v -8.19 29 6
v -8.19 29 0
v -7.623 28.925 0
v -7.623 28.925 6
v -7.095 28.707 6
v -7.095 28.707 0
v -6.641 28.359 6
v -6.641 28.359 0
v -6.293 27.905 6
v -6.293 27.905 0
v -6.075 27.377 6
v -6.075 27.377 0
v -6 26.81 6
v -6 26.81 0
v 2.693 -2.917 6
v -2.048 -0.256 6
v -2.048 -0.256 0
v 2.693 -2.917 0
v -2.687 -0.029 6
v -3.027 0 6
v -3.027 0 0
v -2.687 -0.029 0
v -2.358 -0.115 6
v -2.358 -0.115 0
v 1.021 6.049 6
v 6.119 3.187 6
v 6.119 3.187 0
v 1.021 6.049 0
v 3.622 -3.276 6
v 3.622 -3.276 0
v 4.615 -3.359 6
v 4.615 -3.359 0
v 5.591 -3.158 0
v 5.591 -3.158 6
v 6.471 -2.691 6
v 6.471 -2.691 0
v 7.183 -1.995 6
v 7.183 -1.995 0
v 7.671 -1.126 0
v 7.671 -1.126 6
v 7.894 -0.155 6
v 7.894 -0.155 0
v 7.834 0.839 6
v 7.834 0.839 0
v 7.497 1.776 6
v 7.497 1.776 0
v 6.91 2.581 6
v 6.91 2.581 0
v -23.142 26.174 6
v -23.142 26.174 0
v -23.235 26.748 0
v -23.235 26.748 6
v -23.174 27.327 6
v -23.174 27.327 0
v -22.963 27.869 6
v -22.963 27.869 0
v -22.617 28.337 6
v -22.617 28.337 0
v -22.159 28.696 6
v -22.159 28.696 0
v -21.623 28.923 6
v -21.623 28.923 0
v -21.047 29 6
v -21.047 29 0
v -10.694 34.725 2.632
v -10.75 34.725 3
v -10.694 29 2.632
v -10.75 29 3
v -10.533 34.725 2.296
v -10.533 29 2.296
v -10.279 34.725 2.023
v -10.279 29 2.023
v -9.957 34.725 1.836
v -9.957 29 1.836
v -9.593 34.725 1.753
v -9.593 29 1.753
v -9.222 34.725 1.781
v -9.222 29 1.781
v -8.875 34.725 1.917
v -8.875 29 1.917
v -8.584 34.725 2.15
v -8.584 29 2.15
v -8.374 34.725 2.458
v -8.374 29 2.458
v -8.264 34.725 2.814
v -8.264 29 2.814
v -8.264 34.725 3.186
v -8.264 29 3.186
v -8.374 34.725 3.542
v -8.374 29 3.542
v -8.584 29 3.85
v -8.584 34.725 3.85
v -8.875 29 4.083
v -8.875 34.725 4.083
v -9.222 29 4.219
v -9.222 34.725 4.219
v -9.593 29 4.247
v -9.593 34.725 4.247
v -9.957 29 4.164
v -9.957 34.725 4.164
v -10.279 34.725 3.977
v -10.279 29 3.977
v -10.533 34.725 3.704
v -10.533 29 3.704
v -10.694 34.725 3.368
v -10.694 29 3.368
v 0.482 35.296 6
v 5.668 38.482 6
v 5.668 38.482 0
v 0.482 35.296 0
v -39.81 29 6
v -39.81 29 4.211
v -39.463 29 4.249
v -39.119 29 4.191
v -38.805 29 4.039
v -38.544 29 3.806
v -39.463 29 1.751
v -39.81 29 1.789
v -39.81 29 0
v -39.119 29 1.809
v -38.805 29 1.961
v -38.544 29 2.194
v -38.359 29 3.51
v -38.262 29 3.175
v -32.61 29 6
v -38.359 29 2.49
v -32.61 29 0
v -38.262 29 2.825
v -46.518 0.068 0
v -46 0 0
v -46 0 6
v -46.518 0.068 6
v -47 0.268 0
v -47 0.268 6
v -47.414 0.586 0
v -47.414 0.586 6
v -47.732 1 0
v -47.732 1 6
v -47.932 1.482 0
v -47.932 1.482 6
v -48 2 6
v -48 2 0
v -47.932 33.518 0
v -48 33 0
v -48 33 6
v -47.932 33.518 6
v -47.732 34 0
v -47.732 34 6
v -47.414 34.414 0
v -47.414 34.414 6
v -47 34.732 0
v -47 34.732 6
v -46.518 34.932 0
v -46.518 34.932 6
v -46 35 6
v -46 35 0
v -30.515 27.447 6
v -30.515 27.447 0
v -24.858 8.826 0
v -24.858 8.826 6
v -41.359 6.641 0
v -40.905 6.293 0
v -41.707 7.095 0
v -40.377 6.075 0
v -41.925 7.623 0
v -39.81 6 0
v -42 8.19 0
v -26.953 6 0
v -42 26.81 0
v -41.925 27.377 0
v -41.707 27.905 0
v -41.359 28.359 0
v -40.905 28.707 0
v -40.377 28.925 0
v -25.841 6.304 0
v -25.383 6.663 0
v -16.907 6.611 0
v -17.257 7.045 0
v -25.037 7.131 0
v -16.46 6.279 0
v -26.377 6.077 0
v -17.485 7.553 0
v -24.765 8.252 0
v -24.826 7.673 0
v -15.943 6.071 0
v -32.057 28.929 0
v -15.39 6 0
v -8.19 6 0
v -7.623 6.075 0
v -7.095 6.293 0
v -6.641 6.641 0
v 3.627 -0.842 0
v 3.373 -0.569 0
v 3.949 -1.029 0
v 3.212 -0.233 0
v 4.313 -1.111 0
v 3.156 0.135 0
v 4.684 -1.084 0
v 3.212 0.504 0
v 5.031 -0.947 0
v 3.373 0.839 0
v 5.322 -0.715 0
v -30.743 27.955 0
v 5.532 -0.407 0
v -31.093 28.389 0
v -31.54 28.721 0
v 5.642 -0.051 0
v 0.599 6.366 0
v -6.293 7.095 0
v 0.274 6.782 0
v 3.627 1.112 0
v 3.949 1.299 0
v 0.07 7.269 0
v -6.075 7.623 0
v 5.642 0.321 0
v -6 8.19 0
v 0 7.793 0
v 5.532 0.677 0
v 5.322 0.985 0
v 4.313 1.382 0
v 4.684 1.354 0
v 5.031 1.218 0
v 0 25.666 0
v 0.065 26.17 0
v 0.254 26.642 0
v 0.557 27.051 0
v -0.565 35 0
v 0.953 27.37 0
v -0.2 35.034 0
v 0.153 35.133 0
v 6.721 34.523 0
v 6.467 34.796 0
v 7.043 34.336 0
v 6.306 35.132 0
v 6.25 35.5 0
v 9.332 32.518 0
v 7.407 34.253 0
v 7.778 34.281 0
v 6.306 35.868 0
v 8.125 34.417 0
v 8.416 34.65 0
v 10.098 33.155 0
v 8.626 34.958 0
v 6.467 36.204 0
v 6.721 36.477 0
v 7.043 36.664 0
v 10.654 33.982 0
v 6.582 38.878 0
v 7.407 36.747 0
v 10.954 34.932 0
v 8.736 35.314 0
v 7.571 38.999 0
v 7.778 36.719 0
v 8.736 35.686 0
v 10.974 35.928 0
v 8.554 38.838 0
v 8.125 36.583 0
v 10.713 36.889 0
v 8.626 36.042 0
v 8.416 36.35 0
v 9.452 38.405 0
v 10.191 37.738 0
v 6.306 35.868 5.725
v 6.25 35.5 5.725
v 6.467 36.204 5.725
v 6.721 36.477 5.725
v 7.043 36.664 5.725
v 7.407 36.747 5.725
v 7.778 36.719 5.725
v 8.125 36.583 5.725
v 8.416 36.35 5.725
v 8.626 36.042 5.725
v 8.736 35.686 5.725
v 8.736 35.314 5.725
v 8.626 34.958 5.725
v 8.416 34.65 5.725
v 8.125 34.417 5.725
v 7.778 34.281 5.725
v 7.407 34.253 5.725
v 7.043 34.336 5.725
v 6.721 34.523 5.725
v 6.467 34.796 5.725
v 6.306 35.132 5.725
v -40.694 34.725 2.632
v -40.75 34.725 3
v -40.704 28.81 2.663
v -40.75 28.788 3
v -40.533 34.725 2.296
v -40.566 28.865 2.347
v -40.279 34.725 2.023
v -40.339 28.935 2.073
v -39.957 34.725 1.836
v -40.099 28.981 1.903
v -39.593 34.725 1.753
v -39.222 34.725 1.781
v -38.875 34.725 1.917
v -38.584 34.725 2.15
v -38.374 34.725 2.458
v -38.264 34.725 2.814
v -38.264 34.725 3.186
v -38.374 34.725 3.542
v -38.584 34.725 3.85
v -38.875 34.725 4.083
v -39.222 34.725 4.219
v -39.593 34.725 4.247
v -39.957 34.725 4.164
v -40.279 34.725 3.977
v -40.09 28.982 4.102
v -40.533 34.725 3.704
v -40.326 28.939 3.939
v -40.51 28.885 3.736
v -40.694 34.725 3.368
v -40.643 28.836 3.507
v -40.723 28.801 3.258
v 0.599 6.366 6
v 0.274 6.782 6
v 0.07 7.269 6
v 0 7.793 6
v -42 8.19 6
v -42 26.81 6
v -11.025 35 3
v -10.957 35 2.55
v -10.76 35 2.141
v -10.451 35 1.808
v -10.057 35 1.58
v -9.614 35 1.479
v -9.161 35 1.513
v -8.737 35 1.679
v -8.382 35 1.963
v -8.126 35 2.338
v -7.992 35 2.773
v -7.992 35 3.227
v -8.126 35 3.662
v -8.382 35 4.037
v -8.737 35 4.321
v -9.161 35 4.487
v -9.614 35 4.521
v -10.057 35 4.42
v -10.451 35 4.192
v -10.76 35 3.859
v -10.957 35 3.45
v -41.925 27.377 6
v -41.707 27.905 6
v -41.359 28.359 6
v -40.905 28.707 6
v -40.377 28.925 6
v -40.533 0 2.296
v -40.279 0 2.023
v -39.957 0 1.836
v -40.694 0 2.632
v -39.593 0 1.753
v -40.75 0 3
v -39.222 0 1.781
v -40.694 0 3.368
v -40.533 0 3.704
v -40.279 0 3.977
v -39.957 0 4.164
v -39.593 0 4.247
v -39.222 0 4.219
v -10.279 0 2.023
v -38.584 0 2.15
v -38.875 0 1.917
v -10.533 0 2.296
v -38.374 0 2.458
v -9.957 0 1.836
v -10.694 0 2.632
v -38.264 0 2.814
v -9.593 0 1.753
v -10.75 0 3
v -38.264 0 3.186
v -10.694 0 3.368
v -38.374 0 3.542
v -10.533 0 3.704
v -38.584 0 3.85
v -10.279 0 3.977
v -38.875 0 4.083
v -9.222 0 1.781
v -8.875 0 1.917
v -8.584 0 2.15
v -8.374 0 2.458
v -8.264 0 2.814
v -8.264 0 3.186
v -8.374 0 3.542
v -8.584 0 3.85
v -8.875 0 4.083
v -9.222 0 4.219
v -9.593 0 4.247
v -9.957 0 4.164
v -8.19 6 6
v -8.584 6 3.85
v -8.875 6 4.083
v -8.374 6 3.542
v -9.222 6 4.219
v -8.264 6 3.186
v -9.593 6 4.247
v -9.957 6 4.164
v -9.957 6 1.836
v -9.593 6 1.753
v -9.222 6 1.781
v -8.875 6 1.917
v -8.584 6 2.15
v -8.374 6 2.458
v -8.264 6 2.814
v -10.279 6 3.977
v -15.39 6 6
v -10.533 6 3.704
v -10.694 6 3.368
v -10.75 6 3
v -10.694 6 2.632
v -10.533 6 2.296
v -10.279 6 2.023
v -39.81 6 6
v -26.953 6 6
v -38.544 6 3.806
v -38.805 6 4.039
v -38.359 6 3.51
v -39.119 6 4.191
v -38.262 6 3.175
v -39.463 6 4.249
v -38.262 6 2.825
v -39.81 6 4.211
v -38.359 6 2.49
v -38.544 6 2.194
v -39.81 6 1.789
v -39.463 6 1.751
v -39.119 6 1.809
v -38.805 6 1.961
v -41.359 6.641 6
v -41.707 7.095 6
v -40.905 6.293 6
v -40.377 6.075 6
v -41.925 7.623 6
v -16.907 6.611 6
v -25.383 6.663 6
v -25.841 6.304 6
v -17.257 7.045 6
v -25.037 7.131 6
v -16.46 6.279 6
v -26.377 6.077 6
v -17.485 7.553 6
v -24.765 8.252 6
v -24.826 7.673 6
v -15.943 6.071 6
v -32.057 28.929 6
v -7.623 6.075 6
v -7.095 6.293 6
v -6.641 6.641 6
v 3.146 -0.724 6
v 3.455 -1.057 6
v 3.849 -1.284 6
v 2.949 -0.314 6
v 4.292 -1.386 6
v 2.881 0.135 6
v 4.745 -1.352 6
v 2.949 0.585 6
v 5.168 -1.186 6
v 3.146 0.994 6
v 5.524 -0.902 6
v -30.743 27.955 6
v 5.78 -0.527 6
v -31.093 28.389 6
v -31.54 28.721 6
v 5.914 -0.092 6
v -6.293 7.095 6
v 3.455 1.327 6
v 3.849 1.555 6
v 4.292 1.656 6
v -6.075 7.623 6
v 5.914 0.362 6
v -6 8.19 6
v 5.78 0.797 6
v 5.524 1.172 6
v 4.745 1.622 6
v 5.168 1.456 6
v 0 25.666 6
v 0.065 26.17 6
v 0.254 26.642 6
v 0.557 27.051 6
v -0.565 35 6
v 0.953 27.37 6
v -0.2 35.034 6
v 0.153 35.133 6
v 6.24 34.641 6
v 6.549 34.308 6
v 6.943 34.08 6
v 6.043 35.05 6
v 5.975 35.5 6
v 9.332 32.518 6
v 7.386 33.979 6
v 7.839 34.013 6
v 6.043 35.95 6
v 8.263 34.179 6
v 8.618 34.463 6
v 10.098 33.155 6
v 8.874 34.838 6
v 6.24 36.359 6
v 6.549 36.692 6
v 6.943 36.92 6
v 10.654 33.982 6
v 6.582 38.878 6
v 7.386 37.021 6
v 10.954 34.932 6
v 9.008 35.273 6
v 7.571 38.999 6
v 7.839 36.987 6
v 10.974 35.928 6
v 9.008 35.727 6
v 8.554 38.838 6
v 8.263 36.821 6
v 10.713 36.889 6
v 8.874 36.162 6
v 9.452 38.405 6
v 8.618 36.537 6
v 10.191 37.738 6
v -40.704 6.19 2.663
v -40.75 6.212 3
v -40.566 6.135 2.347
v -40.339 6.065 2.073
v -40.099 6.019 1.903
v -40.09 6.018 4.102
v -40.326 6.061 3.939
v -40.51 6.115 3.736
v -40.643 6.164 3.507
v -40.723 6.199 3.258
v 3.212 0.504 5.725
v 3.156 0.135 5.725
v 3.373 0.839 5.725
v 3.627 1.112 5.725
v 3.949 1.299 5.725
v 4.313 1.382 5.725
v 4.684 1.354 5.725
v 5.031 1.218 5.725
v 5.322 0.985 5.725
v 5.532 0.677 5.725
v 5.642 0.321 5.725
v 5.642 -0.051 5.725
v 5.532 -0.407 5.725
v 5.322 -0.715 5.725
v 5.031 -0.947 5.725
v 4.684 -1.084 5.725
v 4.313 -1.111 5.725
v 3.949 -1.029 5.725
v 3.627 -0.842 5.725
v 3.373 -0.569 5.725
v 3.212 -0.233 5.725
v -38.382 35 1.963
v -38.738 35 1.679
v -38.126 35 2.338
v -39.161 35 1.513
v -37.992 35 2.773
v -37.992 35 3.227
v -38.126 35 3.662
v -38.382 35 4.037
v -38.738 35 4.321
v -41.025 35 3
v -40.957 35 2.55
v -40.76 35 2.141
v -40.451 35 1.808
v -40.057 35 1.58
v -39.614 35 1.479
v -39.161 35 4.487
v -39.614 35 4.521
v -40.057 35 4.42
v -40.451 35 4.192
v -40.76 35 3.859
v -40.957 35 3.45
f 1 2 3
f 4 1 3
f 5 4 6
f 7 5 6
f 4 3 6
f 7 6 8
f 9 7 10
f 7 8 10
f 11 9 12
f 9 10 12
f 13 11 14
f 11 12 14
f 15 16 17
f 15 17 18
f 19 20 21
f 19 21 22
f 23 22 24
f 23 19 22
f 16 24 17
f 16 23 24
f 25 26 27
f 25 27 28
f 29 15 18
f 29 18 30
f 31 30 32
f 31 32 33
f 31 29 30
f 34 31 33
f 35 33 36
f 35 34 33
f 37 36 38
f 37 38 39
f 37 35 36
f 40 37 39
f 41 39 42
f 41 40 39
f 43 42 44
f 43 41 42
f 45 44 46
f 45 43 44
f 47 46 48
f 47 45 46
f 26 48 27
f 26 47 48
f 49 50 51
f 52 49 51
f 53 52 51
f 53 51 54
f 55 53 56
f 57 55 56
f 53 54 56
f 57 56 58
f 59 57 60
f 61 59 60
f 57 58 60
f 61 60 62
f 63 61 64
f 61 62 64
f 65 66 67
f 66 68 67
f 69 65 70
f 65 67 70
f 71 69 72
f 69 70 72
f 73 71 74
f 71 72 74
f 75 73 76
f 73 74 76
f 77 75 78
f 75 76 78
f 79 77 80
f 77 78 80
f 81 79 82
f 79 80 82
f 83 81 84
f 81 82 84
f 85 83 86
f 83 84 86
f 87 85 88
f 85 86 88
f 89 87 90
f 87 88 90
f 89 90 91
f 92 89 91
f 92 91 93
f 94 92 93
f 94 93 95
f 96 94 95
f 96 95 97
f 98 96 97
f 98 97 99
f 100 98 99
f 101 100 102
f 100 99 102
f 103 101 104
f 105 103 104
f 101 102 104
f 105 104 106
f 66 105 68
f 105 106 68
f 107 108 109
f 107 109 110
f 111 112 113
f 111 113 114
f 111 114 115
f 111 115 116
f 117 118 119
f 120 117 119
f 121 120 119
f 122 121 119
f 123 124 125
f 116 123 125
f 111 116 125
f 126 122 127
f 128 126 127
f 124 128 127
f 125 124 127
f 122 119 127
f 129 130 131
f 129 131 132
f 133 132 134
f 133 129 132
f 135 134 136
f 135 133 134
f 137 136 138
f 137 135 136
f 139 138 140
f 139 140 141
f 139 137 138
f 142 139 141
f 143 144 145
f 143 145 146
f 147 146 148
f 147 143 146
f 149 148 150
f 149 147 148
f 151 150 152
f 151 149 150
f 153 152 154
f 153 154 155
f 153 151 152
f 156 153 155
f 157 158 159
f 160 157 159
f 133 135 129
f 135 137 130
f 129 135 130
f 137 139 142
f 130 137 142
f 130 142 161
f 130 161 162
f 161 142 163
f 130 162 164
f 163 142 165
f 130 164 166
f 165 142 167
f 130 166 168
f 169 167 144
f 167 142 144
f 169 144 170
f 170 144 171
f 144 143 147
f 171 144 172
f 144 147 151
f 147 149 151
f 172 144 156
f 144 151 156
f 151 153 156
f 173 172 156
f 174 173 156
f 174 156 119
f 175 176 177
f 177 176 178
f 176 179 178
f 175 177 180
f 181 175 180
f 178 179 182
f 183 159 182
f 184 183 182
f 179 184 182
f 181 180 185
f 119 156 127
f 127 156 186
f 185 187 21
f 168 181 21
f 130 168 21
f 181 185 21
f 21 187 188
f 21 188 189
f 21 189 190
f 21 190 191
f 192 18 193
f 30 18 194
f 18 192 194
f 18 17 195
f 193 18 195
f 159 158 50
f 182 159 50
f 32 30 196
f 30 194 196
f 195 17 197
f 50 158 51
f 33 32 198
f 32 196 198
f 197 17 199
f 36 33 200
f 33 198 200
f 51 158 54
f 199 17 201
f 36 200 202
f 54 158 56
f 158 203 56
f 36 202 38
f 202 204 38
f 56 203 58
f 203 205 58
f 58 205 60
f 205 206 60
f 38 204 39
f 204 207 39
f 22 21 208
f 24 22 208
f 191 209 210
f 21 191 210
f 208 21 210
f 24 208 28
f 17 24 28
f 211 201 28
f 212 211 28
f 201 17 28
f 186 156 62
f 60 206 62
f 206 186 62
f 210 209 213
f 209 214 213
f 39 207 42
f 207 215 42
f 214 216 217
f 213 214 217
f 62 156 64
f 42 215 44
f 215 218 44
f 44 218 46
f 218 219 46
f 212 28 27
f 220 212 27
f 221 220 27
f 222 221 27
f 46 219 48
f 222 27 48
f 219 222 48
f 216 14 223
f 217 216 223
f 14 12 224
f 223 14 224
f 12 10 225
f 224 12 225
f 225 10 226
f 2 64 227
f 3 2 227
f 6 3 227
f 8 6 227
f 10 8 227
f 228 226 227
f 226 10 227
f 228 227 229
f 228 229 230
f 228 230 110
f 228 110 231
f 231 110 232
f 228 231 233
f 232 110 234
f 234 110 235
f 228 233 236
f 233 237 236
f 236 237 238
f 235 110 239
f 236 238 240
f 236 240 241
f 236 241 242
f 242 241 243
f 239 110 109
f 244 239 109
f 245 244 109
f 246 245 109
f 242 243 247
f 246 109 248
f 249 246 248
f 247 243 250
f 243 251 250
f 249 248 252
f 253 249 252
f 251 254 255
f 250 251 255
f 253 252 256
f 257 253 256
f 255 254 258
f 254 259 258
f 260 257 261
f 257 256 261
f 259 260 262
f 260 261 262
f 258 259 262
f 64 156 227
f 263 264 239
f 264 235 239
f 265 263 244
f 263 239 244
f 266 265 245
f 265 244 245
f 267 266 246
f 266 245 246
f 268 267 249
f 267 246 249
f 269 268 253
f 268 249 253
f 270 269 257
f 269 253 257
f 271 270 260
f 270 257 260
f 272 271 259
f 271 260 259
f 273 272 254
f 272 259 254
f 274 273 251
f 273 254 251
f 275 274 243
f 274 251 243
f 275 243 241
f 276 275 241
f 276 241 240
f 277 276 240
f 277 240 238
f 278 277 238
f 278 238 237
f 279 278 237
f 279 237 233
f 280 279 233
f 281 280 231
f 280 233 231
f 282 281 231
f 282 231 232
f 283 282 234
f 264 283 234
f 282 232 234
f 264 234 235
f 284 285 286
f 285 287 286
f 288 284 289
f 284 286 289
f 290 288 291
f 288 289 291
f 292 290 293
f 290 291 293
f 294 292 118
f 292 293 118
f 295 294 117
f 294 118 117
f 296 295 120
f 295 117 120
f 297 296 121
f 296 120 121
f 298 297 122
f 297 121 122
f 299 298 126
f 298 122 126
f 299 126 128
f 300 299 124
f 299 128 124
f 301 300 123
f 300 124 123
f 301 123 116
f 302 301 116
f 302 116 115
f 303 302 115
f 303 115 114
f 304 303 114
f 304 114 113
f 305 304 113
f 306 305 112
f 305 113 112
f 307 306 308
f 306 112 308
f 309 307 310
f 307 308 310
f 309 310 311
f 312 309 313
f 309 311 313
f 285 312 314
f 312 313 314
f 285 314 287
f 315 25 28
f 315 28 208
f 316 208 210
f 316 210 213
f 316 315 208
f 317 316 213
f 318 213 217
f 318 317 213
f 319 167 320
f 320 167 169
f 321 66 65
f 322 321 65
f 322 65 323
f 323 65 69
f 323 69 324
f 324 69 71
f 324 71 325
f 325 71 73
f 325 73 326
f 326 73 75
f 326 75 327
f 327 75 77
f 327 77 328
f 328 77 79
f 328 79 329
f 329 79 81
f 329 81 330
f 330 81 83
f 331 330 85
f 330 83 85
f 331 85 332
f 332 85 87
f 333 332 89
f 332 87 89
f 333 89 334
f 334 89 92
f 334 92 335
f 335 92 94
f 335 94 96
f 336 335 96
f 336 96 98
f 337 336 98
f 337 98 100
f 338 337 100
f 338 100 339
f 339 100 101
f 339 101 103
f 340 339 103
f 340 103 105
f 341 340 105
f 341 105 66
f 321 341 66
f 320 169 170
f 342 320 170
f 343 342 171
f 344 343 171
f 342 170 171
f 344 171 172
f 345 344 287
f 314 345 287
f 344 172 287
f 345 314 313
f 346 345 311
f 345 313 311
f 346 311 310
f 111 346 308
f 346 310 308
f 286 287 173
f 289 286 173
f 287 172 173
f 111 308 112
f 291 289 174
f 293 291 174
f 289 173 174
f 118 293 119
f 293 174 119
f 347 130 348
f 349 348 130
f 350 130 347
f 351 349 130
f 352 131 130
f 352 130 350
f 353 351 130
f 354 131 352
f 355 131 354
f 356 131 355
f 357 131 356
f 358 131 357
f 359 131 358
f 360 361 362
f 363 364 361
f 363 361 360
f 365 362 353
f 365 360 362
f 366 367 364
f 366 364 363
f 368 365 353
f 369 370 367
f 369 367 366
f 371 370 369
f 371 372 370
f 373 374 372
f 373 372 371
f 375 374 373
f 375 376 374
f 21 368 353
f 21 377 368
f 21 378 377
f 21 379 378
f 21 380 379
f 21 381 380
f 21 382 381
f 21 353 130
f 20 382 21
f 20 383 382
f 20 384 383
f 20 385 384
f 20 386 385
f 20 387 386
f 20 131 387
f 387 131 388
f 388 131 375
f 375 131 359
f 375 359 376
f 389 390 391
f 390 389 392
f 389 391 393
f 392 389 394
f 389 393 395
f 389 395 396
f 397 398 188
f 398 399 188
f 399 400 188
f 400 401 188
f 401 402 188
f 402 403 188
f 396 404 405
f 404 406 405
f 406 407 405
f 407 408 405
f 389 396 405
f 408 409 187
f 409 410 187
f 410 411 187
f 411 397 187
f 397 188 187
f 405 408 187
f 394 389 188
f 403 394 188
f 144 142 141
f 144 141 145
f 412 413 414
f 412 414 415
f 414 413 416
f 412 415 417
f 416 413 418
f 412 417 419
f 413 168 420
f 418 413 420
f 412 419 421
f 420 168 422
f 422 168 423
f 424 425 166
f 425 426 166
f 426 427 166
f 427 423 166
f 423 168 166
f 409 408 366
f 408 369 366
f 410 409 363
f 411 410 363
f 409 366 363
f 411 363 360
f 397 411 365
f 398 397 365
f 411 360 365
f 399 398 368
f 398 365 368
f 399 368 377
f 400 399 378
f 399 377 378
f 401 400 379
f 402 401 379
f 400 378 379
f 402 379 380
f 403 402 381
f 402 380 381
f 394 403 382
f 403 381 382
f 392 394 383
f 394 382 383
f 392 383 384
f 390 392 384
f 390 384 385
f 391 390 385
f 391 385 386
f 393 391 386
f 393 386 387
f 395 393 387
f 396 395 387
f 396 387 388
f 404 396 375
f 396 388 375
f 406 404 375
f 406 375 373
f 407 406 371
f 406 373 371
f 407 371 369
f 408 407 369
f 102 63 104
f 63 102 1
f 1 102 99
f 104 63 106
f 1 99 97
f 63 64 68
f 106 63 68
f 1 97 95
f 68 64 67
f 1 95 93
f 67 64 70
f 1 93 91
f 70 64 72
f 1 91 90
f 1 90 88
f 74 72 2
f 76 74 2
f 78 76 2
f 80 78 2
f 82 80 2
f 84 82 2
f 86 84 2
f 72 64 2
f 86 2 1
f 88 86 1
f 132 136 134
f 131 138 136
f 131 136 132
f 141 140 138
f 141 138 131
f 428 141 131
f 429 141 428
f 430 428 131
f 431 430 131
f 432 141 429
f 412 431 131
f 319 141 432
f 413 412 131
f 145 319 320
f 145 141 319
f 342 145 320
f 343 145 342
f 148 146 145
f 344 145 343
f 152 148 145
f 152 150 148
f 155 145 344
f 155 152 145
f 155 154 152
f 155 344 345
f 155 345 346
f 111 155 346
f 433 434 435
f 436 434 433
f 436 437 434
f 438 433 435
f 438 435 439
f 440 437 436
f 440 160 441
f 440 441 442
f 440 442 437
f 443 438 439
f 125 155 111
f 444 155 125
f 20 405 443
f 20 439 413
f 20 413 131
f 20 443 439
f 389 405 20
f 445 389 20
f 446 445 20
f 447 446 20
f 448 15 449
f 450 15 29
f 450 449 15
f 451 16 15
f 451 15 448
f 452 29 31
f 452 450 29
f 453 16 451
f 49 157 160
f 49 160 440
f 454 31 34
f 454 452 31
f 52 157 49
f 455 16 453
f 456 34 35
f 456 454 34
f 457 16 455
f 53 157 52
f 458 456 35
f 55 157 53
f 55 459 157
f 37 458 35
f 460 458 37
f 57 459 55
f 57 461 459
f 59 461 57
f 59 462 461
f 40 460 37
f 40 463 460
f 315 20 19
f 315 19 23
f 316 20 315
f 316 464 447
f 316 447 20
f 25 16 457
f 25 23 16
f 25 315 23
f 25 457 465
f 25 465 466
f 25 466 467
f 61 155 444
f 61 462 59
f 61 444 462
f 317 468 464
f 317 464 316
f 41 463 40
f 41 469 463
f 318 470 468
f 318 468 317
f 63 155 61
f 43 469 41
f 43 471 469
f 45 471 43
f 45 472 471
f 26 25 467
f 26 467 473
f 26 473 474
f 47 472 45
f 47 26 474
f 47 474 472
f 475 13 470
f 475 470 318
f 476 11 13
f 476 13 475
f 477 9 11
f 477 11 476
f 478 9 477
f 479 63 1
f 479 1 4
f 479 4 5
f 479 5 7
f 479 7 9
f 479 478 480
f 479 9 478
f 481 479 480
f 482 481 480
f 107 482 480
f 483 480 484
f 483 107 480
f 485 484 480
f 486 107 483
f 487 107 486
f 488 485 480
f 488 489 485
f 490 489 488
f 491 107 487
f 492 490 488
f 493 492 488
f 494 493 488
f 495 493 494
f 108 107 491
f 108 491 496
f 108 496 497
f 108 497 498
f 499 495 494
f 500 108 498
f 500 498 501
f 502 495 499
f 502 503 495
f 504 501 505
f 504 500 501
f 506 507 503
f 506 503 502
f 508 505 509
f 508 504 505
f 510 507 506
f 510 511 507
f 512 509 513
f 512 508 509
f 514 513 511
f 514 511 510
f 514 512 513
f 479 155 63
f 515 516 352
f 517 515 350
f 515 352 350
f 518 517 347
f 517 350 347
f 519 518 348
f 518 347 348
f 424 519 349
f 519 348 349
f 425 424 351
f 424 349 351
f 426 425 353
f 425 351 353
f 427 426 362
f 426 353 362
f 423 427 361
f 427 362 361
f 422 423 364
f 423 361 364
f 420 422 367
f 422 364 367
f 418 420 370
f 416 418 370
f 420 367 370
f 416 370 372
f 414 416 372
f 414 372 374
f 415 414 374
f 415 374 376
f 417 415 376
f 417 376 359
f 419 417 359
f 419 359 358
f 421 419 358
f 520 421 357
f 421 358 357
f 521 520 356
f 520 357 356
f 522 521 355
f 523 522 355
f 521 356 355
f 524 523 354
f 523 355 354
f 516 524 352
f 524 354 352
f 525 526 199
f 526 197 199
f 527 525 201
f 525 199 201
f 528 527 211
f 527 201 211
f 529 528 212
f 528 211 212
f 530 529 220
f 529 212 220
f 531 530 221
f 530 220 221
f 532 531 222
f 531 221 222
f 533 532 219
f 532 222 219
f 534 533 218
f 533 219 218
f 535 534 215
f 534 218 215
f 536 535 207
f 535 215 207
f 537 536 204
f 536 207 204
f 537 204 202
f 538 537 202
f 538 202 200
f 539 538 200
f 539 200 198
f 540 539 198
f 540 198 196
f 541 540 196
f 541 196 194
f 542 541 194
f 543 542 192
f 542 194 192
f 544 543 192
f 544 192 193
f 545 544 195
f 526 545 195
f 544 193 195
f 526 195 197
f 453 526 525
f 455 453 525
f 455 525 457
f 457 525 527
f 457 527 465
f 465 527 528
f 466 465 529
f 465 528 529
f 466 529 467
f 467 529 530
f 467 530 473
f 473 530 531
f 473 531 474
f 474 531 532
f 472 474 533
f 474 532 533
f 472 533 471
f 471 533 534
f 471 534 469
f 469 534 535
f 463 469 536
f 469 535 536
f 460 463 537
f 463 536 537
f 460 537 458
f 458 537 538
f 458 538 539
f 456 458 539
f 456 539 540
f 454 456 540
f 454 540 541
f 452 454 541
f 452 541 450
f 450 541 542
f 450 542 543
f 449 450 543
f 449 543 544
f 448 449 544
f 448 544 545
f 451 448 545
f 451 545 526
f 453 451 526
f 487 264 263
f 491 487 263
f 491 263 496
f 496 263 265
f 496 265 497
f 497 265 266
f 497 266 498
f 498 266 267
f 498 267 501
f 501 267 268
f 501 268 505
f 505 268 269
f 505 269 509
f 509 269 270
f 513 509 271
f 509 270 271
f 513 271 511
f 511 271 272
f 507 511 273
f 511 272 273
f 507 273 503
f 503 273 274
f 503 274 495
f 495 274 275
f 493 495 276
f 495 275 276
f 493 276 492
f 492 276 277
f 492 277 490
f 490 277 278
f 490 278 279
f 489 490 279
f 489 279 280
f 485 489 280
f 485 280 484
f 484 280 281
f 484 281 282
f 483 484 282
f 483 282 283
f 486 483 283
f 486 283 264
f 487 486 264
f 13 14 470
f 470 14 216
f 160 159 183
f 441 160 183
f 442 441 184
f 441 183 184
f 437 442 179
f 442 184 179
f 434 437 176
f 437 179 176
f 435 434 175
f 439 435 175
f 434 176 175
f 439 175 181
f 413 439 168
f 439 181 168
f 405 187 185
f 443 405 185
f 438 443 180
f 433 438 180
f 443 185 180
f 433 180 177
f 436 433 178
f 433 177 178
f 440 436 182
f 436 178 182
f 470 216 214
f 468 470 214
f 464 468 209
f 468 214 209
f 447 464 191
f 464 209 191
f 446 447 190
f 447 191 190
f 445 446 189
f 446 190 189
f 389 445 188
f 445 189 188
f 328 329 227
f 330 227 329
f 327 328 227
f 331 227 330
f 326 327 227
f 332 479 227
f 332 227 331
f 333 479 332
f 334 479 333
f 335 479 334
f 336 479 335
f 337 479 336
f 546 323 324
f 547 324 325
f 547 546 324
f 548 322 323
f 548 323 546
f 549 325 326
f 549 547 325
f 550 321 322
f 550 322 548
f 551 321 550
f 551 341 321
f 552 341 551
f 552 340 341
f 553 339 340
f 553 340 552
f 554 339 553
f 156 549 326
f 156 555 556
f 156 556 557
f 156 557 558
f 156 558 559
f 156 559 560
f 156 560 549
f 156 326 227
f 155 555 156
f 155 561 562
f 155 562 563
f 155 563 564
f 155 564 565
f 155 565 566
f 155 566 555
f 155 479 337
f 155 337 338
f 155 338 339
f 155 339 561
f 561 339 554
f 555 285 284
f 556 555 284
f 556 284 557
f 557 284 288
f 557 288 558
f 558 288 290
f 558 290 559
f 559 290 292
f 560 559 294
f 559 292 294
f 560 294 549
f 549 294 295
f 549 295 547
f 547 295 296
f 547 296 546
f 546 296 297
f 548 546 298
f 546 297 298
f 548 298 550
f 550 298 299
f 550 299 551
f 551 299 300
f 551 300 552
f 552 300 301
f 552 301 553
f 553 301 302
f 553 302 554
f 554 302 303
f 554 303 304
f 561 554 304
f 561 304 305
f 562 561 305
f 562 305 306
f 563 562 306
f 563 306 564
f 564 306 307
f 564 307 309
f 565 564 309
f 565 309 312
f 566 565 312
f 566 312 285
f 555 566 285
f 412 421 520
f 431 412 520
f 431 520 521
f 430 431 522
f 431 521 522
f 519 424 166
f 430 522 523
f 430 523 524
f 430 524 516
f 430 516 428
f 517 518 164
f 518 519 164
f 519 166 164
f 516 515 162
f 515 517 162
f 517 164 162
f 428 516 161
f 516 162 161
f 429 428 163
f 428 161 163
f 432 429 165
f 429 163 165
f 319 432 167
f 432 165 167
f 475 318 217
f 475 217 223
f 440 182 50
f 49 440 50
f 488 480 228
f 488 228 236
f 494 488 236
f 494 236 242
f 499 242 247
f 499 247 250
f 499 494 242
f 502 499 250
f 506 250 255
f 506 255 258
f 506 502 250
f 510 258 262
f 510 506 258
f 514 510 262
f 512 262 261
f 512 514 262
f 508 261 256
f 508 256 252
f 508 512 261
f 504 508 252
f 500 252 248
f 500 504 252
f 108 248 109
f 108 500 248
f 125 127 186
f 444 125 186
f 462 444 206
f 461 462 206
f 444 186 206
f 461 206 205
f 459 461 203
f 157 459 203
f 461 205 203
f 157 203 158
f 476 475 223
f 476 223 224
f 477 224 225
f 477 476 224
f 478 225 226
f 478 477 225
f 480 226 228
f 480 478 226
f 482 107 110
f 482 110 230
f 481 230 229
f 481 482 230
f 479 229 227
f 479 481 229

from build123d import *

# Parameters (mm, degrees)
EXTRUDE_1_DEPTH              = 6
EXTRUDE_2_DEPTH              = 6
HOLE_WIZARD_M3_1_D           = 2.5
HOLE_WIZARD_M3_1_CSINK_D     = 3.05
HOLE_WIZARD_M3_1_CSINK_ANGLE = 90
HOLE_WIZARD_M3_2_D           = 2.5
HOLE_WIZARD_M3_2_CSINK_D     = 3.05
HOLE_WIZARD_M3_2_CSINK_ANGLE = 90


with BuildPart() as part:
    # 草图1 → 凸台-拉伸1 (new body)
    with BuildSketch(Plane.XY):
        with BuildLine():
            Line((0, 0), (-46, 0))
            ThreePointArc((-46, 0), (-47.414213562, 0.585786438), (-48, 2))
            Line((-48, 2), (-48, 33))
            ThreePointArc((-48, 33), (-47.414213562, 34.414213562), (-46, 35))
            Line((-46, 35), (0, 35))
            Line((0, 35), (0, 0))
        make_face()
        with BuildLine():
            Line((-30.514833292, 27.446840468), (-24.85843299, 8.825962624))
            ThreePointArc((-24.85843299, 8.825962624), (-25.194545135, 6.885579165), (-26.953467783, 6))
            Line((-26.953467783, 6), (-39.810438922, 6))
            ThreePointArc((-39.810438922, 6), (-41.358692408, 6.641307592), (-42, 8.189561078))
            Line((-42, 8.189561078), (-42, 26.810438922))
            ThreePointArc((-42, 26.810438922), (-41.358692408, 28.358692408), (-39.810438922, 29))
            Line((-39.810438922, 29), (-32.609868086, 29))
            ThreePointArc((-32.609868086, 29), (-31.305886173, 28.569361571), (-30.514833292, 27.446840468))
        make_face(mode=Mode.SUBTRACT)
        with BuildLine():
            Line((-6, 26.810438922), (-6, 8.189561078))
            ThreePointArc((-6, 8.189561078), (-6.641307592, 6.641307592), (-8.189561078, 6))
            Line((-8.189561078, 6), (-15.390131914, 6))
            ThreePointArc((-15.390131914, 6), (-16.694113827, 6.430638429), (-17.485166708, 7.553159532))
            Line((-17.485166708, 7.553159532), (-23.14156701, 26.174037376))
            ThreePointArc((-23.14156701, 26.174037376), (-22.805454865, 28.114420835), (-21.046532217, 29))
            Line((-21.046532217, 29), (-8.189561078, 29))
            ThreePointArc((-8.189561078, 29), (-6.641307592, 28.358692408), (-6, 26.810438922))
        make_face(mode=Mode.SUBTRACT)
    extrude(amount=EXTRUDE_1_DEPTH)

    # 草图3 → 凸台-拉伸2 (add)
    with BuildSketch(Plane.XY.offset(6)):
        with BuildLine():
            Line((5.667856321, 38.482155184), (0.48165081, 35.295911324))
            ThreePointArc((0.48165081, 35.295911324), (-0.021311116, 35.075399086), (-0.565288435, 35))
            Line((-0.565288435, 35), (-3.393768866, 35))
            Line((-3.393768866, 35), (-3.393768866, 0))
            Line((-3.393768866, 0), (-3.026694271, 0))
            ThreePointArc((-3.026694271, 0), (-2.520753033, -0.065052077), (-2.047724325, -0.255976536))
            Line((-2.047724325, -0.255976536), (2.692773727, -2.916952845))
            ThreePointArc((2.692773727, -2.916952845), (7.458012195, -1.578109188), (6.119168538, 3.187129281))
            Line((6.119168538, 3.187129281), (1.021030054, 6.048859331))
            ThreePointArc((1.021030054, 6.048859331), (0.274030723, 6.782422478), (0, 7.792882796))
            Line((0, 7.792882796), (0, 25.665907397))
            ThreePointArc((0, 25.665907397), (0.254451592, 26.642155703), (0.953060755, 27.369996073))
            Line((0.953060755, 27.369996073), (9.332143679, 32.517844816))
            ThreePointArc((9.332143679, 32.517844816), (10.482155184, 37.332143679), (5.667856321, 38.482155184))
        make_face()
    extrude(amount=-EXTRUDE_2_DEPTH)

    # M3 螺纹孔1 (through all)
    with Locations(Plane.XY.offset(6)):
        with Locations((7.5, 35.5), (4.405971132, 0.135088218)):
            CounterSinkHole(HOLE_WIZARD_M3_1_D / 2, HOLE_WIZARD_M3_1_CSINK_D / 2, counter_sink_angle=HOLE_WIZARD_M3_1_CSINK_ANGLE)

    # M3 螺纹孔2 (through all)
    with Locations(Plane(origin=(0, 35, 0), x_dir=(1, 0, 0), z_dir=(0, 1, 0))):
        with Locations((-39.5, -3), (-9.5, -3)):
            CounterSinkHole(HOLE_WIZARD_M3_2_D / 2, HOLE_WIZARD_M3_2_CSINK_D / 2, counter_sink_angle=HOLE_WIZARD_M3_2_CSINK_ANGLE)


solid = part.part
